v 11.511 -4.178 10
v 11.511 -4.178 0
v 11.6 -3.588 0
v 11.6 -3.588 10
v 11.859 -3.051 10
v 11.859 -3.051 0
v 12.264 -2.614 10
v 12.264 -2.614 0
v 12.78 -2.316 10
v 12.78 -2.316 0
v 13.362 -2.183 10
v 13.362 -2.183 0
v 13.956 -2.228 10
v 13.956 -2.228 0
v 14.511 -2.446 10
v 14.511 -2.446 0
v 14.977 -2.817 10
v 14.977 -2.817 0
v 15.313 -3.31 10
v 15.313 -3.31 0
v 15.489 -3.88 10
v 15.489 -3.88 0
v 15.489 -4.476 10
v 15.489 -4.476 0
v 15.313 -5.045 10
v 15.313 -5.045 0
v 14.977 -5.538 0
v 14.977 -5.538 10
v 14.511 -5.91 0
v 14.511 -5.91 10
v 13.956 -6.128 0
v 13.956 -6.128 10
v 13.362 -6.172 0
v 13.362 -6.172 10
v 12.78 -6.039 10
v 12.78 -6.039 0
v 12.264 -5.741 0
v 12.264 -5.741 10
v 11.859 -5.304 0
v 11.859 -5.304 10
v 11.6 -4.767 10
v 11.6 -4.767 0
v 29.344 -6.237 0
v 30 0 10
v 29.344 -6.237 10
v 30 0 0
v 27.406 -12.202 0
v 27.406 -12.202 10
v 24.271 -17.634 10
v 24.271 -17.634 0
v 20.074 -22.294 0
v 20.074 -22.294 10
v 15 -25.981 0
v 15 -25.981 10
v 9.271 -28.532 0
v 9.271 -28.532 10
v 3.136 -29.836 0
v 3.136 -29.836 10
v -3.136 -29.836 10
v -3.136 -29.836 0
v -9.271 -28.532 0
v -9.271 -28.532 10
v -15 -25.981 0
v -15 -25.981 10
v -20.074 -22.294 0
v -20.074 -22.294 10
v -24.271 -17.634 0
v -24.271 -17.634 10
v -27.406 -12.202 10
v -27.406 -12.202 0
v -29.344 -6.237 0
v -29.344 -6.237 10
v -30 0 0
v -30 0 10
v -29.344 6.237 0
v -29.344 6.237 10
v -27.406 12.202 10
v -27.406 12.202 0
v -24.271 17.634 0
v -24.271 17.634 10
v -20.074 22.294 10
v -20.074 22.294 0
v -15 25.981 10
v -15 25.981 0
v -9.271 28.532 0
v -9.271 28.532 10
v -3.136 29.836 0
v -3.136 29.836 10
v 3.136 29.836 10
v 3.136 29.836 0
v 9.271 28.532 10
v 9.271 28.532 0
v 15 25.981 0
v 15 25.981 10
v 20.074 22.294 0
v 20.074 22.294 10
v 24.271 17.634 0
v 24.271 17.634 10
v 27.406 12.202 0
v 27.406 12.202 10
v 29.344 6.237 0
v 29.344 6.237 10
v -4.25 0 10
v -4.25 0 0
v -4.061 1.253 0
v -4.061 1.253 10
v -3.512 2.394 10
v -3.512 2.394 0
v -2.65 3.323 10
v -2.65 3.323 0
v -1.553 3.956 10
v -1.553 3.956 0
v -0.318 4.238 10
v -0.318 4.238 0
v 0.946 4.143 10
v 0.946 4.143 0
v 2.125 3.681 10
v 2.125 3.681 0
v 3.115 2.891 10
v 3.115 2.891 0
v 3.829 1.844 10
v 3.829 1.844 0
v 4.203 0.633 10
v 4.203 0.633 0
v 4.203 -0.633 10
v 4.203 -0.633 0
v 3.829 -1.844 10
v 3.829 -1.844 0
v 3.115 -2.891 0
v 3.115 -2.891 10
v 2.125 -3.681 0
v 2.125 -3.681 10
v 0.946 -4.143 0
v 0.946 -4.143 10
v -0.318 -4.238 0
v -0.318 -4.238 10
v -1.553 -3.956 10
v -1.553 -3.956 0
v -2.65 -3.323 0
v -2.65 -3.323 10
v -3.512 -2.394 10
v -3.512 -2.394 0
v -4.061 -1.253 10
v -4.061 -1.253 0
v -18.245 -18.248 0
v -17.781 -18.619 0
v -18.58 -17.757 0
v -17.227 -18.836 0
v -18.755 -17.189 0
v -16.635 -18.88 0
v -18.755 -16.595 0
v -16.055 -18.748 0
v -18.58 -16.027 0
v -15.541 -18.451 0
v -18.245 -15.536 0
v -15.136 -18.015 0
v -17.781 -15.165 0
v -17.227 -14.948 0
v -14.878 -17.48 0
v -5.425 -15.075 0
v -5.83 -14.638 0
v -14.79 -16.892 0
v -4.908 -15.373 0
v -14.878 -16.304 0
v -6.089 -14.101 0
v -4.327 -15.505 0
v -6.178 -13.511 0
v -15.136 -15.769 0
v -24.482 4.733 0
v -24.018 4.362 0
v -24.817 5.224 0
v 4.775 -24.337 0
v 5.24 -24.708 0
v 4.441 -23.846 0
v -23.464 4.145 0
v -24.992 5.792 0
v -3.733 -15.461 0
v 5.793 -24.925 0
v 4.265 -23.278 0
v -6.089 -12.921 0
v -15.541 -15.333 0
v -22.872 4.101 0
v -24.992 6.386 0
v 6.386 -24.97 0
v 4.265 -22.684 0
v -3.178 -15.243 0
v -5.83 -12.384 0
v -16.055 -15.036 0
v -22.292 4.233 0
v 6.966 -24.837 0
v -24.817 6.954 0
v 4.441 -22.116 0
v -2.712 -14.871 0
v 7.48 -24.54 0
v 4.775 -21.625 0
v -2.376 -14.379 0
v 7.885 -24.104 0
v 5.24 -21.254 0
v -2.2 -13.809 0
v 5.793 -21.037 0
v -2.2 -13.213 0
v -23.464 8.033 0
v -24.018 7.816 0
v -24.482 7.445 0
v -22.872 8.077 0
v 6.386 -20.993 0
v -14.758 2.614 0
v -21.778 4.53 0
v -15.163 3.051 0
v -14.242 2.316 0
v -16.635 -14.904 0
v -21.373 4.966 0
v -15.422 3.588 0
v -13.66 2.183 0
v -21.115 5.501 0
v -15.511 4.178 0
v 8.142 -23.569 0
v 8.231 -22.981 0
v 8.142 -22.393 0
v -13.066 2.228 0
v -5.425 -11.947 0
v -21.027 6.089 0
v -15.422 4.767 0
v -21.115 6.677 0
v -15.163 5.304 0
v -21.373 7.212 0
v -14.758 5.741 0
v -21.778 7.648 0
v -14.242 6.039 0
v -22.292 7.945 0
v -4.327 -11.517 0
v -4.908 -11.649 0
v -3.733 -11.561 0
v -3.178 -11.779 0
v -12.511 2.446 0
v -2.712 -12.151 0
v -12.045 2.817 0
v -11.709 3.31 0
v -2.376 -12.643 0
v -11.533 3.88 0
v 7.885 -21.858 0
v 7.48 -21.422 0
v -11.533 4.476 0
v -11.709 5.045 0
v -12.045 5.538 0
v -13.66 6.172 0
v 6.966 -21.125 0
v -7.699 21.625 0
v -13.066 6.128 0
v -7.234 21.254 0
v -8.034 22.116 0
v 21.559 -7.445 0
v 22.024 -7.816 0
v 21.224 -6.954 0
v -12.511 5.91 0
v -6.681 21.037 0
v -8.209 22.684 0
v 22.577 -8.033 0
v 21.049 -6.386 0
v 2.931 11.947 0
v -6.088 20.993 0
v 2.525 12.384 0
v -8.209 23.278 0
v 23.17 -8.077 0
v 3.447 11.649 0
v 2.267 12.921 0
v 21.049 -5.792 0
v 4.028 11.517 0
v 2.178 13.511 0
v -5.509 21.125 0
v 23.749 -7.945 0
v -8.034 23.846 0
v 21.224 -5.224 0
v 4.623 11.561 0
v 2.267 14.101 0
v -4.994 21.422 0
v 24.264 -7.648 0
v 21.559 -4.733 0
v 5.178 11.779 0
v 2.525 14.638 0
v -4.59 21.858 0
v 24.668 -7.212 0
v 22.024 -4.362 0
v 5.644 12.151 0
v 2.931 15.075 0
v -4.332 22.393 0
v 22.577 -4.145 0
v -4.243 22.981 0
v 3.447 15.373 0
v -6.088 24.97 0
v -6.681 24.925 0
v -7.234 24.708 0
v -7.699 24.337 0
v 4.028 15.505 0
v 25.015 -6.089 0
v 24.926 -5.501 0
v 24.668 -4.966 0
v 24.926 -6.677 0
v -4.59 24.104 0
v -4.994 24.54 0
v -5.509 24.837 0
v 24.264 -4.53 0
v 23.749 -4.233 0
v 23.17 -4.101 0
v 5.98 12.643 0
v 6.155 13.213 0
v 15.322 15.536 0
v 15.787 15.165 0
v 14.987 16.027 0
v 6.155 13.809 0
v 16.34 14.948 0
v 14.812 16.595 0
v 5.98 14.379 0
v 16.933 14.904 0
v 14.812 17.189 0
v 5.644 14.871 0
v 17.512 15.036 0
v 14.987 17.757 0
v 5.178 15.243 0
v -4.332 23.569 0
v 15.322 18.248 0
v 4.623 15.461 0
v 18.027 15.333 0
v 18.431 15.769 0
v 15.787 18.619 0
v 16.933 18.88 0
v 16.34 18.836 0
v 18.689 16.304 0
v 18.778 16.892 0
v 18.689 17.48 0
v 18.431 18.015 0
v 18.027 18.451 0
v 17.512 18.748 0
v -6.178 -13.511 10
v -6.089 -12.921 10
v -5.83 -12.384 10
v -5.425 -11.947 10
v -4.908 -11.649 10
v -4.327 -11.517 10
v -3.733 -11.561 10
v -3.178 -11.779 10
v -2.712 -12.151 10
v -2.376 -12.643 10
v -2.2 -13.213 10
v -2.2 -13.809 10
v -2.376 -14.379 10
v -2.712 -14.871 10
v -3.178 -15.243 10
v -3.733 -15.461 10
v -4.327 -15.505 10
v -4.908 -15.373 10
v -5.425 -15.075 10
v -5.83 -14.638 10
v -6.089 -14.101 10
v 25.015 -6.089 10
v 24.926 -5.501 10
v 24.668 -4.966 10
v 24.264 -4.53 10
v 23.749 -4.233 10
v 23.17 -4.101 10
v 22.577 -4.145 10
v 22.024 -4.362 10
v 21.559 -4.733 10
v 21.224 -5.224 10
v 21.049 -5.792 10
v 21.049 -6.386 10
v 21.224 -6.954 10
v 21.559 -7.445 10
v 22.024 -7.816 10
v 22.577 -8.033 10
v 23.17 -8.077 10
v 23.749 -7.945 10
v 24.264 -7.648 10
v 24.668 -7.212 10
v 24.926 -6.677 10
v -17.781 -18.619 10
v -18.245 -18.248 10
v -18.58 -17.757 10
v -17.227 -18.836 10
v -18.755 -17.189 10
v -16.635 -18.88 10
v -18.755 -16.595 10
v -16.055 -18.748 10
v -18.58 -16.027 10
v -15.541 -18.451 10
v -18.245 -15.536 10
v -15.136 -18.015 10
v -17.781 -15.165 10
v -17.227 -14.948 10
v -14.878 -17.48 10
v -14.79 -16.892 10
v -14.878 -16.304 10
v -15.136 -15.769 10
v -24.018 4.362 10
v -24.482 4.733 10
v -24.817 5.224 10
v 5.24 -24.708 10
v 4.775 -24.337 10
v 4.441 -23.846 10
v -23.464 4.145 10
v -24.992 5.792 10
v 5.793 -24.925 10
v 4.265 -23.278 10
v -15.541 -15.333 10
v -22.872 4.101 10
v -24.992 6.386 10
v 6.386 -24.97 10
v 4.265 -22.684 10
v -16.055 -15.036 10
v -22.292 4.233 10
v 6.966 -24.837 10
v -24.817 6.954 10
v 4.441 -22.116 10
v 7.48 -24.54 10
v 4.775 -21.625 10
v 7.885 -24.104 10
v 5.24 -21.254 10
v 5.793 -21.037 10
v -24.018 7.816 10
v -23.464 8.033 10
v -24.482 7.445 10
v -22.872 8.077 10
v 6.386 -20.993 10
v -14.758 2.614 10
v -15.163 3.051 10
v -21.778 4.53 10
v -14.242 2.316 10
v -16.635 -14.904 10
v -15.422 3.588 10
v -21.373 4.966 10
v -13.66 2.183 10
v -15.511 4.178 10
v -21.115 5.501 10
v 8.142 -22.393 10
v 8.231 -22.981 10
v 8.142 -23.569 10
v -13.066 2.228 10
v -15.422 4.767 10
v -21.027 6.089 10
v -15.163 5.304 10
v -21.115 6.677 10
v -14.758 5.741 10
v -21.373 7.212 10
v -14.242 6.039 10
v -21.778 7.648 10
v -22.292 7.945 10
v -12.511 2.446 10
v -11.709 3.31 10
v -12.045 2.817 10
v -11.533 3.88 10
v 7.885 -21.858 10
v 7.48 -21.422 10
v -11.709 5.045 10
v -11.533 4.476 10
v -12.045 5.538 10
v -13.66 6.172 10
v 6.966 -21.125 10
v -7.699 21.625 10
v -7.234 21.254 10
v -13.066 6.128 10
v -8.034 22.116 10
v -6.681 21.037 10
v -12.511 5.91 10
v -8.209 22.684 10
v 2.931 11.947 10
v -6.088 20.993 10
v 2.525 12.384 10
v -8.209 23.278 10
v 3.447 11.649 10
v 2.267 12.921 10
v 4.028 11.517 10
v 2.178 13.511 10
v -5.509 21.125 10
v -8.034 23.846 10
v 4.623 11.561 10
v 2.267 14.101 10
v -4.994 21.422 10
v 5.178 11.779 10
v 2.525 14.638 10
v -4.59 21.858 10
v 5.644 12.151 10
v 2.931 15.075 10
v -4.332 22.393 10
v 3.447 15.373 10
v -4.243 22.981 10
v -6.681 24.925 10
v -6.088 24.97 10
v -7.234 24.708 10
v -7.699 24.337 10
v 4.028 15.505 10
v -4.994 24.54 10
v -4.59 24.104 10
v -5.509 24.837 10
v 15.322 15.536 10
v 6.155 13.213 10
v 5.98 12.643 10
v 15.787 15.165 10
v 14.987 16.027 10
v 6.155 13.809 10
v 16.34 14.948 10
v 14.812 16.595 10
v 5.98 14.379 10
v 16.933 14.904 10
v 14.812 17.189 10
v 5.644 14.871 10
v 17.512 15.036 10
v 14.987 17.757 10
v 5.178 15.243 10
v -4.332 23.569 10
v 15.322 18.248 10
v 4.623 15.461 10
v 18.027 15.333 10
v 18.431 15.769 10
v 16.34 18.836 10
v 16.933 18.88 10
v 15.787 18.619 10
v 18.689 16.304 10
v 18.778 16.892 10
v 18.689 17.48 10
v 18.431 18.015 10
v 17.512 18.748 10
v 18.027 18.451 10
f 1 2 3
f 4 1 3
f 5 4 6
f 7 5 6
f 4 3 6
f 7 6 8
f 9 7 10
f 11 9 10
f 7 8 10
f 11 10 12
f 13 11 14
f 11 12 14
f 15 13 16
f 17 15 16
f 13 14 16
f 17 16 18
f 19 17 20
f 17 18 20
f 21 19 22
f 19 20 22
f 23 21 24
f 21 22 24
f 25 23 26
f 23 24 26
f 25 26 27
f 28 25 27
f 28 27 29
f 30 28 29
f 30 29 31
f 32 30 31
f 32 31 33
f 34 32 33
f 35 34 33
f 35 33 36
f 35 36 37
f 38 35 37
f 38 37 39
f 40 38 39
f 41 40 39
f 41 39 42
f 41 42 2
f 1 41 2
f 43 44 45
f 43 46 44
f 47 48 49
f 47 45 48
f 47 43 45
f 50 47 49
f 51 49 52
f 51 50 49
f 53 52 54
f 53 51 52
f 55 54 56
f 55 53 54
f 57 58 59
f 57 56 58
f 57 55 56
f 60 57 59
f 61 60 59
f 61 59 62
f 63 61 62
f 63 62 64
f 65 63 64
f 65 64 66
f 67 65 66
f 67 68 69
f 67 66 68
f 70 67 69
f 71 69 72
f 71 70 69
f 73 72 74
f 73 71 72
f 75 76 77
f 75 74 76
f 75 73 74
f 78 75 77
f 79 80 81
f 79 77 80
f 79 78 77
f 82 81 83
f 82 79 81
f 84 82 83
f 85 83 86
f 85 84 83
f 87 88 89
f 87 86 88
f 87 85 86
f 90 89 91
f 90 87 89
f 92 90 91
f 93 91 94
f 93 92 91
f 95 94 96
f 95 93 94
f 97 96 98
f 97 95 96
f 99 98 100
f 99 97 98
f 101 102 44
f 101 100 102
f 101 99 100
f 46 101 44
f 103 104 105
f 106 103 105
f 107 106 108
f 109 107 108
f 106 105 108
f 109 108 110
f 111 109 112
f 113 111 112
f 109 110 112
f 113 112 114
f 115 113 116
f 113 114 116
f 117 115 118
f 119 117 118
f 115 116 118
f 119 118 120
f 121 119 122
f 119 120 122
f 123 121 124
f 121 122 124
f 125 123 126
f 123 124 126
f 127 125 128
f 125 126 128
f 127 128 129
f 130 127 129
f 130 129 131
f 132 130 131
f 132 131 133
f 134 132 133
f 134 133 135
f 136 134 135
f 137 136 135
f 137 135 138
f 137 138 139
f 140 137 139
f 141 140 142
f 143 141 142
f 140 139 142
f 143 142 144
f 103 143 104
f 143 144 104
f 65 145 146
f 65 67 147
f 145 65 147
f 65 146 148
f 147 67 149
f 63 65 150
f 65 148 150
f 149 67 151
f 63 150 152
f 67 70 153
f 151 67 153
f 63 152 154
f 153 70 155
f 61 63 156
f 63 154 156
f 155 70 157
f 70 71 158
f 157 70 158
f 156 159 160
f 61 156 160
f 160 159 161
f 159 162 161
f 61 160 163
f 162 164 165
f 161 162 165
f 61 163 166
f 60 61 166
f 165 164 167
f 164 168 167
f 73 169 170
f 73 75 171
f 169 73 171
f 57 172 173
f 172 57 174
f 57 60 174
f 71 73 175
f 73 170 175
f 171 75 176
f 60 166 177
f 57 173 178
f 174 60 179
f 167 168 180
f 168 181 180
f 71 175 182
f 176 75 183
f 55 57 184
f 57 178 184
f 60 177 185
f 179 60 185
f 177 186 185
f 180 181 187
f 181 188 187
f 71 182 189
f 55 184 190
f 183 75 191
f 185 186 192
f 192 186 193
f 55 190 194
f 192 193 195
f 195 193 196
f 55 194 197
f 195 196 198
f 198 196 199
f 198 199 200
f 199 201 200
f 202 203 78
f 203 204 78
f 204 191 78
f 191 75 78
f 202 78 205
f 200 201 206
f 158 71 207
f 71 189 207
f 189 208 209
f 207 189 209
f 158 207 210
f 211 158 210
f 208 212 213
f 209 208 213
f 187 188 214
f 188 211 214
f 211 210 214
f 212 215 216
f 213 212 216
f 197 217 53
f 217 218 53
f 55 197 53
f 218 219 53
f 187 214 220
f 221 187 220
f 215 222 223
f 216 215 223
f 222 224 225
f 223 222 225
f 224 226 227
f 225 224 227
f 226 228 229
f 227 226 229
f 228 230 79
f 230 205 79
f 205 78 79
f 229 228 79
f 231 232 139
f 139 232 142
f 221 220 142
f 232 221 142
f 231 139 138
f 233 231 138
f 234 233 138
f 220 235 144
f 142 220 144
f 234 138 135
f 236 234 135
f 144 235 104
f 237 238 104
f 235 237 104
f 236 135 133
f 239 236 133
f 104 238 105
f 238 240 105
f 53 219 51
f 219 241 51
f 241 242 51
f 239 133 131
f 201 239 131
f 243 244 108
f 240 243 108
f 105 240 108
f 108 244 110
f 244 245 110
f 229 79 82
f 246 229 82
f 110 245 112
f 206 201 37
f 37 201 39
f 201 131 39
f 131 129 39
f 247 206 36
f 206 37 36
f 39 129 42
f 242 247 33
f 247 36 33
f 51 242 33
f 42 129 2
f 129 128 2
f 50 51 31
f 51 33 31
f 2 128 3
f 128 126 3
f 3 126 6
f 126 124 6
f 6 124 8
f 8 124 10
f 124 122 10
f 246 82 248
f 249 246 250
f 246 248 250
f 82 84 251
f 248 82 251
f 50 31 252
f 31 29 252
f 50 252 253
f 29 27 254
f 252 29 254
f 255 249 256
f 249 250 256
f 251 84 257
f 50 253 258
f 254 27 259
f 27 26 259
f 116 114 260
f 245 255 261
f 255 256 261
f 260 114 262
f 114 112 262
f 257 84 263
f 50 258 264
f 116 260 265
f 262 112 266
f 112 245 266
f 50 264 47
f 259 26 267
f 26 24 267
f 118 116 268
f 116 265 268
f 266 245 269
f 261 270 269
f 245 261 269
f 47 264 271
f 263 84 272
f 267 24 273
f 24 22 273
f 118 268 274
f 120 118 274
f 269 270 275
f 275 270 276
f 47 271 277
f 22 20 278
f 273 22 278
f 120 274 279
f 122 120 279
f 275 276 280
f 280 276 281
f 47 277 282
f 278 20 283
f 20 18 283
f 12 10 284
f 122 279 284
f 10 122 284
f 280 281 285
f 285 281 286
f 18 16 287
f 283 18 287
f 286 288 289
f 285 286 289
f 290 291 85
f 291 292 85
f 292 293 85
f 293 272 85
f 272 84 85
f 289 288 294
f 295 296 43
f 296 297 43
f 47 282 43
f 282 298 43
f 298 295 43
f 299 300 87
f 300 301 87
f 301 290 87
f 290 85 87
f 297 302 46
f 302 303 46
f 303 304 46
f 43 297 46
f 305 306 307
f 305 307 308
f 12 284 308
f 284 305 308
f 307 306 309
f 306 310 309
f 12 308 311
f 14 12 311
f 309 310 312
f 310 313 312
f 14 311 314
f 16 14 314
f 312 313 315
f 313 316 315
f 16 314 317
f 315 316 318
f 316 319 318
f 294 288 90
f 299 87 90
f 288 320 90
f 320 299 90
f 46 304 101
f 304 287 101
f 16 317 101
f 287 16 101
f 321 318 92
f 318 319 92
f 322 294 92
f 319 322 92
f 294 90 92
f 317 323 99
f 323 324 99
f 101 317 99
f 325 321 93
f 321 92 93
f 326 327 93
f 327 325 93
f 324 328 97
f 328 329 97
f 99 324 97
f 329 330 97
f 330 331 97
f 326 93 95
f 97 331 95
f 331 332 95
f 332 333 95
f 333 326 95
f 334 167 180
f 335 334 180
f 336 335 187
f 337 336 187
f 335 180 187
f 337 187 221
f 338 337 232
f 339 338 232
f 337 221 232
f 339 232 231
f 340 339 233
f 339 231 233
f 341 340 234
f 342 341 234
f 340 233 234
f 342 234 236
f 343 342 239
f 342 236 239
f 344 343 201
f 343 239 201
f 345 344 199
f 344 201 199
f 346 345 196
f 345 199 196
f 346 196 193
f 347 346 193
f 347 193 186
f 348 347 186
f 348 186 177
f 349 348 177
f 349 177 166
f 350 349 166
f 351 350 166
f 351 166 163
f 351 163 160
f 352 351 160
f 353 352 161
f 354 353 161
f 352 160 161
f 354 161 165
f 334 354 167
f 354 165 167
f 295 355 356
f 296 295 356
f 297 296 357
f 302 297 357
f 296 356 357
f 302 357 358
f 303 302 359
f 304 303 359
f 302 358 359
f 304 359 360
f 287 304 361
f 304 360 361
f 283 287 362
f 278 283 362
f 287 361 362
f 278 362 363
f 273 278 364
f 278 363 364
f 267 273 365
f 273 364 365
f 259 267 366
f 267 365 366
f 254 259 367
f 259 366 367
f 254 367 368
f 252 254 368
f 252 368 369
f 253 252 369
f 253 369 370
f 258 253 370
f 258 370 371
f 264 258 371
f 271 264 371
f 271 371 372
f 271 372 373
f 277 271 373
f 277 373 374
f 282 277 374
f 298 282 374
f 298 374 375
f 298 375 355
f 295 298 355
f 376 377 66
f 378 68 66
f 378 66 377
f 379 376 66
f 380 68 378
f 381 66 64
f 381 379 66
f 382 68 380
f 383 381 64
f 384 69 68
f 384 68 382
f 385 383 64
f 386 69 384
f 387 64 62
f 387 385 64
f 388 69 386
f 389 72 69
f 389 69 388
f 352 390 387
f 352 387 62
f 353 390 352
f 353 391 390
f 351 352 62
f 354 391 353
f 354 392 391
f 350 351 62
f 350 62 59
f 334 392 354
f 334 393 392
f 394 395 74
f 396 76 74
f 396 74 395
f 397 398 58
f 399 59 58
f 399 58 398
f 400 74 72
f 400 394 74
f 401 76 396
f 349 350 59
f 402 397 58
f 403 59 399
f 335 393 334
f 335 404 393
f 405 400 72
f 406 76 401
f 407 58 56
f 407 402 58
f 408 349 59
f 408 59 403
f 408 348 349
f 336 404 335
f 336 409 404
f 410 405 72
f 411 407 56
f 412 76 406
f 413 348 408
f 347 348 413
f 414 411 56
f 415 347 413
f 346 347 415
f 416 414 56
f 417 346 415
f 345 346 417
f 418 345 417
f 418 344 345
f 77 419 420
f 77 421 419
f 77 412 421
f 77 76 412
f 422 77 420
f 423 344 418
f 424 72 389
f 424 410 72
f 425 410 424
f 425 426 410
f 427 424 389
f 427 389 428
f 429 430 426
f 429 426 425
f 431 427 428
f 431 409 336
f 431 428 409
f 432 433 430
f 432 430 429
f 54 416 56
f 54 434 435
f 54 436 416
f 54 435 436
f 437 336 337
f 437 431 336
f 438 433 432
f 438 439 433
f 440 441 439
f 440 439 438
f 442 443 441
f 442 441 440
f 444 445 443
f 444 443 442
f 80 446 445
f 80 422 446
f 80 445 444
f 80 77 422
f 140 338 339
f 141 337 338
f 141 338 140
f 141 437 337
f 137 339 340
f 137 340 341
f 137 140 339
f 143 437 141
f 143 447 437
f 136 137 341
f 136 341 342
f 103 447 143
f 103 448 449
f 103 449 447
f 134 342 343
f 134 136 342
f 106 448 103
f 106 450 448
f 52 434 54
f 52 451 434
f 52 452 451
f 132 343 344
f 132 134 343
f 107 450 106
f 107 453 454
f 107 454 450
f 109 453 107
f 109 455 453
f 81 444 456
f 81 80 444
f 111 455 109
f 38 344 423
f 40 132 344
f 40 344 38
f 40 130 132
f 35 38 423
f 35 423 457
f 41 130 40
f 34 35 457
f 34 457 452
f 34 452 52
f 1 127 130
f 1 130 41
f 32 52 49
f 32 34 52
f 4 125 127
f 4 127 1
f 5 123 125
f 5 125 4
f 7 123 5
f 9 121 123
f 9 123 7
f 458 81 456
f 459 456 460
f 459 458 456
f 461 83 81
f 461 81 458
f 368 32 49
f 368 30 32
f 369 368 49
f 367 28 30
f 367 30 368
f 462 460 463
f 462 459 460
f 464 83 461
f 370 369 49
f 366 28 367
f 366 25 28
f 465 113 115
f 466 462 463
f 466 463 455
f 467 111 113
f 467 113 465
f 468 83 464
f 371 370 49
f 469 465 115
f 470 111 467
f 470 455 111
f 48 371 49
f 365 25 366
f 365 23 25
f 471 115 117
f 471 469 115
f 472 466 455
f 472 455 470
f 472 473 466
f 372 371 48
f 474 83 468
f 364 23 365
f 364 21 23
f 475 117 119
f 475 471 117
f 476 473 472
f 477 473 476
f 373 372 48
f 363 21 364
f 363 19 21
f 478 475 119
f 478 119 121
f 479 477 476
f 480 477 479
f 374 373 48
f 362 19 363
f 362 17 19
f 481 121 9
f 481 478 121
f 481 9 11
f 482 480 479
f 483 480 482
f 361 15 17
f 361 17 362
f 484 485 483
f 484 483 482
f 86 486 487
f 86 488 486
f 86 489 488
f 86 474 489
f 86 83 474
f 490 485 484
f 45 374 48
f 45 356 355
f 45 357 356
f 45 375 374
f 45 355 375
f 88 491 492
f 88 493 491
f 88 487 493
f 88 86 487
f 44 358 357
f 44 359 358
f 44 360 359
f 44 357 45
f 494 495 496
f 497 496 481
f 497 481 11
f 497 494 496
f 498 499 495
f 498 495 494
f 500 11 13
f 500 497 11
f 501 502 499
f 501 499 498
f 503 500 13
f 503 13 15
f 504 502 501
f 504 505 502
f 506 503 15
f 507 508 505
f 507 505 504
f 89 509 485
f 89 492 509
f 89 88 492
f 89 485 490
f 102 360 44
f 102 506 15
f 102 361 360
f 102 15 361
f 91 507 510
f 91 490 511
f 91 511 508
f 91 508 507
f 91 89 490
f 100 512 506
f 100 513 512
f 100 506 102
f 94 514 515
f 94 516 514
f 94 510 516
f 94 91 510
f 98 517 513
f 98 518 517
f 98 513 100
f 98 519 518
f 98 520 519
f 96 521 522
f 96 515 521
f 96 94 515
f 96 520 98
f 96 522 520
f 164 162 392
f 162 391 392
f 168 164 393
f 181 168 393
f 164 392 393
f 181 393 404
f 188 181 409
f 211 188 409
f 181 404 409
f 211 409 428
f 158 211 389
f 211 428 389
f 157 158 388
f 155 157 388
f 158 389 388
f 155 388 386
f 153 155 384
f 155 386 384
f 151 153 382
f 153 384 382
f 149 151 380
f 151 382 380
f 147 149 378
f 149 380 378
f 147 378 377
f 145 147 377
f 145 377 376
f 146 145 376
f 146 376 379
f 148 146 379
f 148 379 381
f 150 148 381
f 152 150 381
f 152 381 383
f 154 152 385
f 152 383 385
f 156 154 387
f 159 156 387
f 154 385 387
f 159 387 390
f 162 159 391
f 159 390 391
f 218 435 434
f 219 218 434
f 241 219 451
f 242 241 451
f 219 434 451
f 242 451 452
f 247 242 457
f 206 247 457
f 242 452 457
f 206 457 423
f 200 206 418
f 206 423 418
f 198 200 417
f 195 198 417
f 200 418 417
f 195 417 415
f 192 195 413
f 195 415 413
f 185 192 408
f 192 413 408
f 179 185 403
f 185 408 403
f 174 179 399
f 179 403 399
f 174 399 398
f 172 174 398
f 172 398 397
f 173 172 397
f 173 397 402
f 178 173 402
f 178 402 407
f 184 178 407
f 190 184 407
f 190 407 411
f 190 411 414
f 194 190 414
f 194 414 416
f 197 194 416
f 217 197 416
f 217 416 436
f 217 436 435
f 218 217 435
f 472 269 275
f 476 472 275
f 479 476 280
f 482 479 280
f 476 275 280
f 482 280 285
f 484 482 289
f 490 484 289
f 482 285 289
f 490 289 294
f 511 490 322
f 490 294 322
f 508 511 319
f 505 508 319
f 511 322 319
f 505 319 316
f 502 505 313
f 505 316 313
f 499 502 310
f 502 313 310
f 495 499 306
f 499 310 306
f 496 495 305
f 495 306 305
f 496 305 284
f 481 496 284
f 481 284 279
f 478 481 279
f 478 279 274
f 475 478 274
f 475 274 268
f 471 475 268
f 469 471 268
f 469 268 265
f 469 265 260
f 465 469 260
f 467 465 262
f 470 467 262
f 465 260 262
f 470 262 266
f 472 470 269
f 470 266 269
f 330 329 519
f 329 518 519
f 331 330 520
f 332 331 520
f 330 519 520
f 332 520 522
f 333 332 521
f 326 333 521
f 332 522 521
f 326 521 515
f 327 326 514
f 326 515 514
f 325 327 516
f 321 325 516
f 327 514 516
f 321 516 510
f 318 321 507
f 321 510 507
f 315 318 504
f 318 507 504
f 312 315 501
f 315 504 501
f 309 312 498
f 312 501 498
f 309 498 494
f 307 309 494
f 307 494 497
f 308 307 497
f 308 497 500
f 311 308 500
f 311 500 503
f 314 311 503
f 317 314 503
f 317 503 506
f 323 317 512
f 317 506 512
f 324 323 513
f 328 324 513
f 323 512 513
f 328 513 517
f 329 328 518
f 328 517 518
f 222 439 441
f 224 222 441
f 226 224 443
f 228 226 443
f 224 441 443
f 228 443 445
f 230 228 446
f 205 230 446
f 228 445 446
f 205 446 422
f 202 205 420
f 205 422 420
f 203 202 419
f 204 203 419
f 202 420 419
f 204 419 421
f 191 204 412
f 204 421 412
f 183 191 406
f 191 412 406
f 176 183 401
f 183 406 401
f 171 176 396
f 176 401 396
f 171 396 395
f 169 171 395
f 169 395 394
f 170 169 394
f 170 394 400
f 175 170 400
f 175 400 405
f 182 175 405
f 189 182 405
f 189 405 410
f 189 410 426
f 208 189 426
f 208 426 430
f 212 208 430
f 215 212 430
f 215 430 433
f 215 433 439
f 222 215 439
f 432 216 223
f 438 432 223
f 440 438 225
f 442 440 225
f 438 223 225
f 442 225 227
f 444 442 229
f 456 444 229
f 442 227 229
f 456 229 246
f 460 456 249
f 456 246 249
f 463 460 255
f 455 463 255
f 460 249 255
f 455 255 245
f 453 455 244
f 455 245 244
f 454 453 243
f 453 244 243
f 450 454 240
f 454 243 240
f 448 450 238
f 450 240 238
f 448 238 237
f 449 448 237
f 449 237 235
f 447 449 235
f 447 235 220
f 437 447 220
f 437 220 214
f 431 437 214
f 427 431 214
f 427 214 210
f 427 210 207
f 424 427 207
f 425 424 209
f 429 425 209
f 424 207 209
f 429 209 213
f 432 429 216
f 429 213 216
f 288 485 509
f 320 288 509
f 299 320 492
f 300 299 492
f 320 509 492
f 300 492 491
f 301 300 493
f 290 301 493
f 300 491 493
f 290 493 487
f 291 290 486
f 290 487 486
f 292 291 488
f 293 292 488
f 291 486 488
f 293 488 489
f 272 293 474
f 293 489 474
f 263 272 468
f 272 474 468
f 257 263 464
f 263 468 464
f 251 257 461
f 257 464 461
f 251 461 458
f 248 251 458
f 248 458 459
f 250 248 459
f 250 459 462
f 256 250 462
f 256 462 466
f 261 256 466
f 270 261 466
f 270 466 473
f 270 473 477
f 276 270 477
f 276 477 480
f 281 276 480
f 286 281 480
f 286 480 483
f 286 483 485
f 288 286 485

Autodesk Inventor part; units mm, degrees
ref_plane "YZ Plane" through (0, 0, 0) normal (1, 0, 0) x (0, 1, 0)
ref_plane "XZ Plane" through (0, 0, 0) normal (0, 1, 0) x (-1, 0, 0)
ref_plane "XY Plane" through (0, 0, 0) normal (0, 0, 1) x (1, 0, 0)
sketch "Sketch1" plane through (0, 0, 0) normal (0, 0, 1) x (1, 0, 0)
  circle A0 centre (0, 0) radius 30
  dimension "d0" = 60
extrude "Extrusion1" add sketch "Sketch1" along normal blind 10
sketch "Sketch2" plane through (0, 0, 10) normal (0, 0, 1) x (1, 0, 0)
  circle A0 centre (6.2371, -22.9812) radius 1.9939
  circle A1 centre (23.0208, -6.0891) radius 1.9939
  circle A2 centre (-23.0208, 6.0891) radius 1.9939
  circle A3 centre (-16.7837, -16.8921) radius 1.9939
  circle A4 centre (-6.2371, 22.9812) radius 1.9939
  circle A5 centre (16.7837, 16.8921) radius 1.9939
  circle A6 centre (0, 0) radius 14.2875 construction
  point P0 (0, 0)
extrude "Extrusion2" cut sketch "Sketch2" against normal through all
sketch "Sketch3" plane through (0, 0, 0) normal (0, 0, -1) x (-1, 0, 0)
  circle A0 centre (-13.511, -4.1777) radius 2 projected
  circle A1 centre (-4.1777, 13.511) radius 2 projected
  circle A2 centre (4.1777, -13.511) radius 2 projected
  circle A3 centre (13.511, 4.1777) radius 2 projected
  circle A4 centre (4.1777, -13.511) radius 2 projected
  point P0 (0, 0)
extrude "Extrusion3" cut sketch "Sketch3" against normal through all
sketch "Sketch4" plane through (0, 0, 0) normal (0, 0, -1) x (-1, 0, 0)
  circle A0 centre (0, 0) radius 4 construction
  circle A1 centre (-4.1777, 13.511) radius 2 projected
  circle A2 centre (13.511, 4.1777) radius 2 projected
  circle A3 centre (-13.511, -4.1777) radius 2 projected
  circle A4 centre (4.1777, -13.511) radius 2 projected
  circle A5 centre (-6.2371, -22.9812) radius 1.9939 projected
  circle A6 centre (6.2371, 22.9812) radius 1.9939 projected
  circle A7 centre (-23.0208, -6.0891) radius 1.9939 projected
  circle A8 centre (16.7837, -16.8921) radius 1.9939 projected
  circle A9 centre (23.0208, 6.0891) radius 1.9939 projected
  circle A10 centre (-16.7837, 16.8921) radius 1.9939 projected
  circle A11 centre (0, 0) radius 30 projected
  circle A12 centre (0, 0) radius 4.25
  dimension "d7" = 8.5
extrude "Extrusion4" cut sketch "Sketch4" against normal through all contours A12
sketch "Sketch5" plane through (0, 0, 0) normal (0, 0, -1) x (-1, 0, 0)
  circle A0 centre (0, 0) radius 12.25 construction
  circle A1 centre (0, 0) radius 4.25 projected
  circle A2 centre (0, 0) radius 12
  dimension "d10" = 24
properties part number "LegHub"
